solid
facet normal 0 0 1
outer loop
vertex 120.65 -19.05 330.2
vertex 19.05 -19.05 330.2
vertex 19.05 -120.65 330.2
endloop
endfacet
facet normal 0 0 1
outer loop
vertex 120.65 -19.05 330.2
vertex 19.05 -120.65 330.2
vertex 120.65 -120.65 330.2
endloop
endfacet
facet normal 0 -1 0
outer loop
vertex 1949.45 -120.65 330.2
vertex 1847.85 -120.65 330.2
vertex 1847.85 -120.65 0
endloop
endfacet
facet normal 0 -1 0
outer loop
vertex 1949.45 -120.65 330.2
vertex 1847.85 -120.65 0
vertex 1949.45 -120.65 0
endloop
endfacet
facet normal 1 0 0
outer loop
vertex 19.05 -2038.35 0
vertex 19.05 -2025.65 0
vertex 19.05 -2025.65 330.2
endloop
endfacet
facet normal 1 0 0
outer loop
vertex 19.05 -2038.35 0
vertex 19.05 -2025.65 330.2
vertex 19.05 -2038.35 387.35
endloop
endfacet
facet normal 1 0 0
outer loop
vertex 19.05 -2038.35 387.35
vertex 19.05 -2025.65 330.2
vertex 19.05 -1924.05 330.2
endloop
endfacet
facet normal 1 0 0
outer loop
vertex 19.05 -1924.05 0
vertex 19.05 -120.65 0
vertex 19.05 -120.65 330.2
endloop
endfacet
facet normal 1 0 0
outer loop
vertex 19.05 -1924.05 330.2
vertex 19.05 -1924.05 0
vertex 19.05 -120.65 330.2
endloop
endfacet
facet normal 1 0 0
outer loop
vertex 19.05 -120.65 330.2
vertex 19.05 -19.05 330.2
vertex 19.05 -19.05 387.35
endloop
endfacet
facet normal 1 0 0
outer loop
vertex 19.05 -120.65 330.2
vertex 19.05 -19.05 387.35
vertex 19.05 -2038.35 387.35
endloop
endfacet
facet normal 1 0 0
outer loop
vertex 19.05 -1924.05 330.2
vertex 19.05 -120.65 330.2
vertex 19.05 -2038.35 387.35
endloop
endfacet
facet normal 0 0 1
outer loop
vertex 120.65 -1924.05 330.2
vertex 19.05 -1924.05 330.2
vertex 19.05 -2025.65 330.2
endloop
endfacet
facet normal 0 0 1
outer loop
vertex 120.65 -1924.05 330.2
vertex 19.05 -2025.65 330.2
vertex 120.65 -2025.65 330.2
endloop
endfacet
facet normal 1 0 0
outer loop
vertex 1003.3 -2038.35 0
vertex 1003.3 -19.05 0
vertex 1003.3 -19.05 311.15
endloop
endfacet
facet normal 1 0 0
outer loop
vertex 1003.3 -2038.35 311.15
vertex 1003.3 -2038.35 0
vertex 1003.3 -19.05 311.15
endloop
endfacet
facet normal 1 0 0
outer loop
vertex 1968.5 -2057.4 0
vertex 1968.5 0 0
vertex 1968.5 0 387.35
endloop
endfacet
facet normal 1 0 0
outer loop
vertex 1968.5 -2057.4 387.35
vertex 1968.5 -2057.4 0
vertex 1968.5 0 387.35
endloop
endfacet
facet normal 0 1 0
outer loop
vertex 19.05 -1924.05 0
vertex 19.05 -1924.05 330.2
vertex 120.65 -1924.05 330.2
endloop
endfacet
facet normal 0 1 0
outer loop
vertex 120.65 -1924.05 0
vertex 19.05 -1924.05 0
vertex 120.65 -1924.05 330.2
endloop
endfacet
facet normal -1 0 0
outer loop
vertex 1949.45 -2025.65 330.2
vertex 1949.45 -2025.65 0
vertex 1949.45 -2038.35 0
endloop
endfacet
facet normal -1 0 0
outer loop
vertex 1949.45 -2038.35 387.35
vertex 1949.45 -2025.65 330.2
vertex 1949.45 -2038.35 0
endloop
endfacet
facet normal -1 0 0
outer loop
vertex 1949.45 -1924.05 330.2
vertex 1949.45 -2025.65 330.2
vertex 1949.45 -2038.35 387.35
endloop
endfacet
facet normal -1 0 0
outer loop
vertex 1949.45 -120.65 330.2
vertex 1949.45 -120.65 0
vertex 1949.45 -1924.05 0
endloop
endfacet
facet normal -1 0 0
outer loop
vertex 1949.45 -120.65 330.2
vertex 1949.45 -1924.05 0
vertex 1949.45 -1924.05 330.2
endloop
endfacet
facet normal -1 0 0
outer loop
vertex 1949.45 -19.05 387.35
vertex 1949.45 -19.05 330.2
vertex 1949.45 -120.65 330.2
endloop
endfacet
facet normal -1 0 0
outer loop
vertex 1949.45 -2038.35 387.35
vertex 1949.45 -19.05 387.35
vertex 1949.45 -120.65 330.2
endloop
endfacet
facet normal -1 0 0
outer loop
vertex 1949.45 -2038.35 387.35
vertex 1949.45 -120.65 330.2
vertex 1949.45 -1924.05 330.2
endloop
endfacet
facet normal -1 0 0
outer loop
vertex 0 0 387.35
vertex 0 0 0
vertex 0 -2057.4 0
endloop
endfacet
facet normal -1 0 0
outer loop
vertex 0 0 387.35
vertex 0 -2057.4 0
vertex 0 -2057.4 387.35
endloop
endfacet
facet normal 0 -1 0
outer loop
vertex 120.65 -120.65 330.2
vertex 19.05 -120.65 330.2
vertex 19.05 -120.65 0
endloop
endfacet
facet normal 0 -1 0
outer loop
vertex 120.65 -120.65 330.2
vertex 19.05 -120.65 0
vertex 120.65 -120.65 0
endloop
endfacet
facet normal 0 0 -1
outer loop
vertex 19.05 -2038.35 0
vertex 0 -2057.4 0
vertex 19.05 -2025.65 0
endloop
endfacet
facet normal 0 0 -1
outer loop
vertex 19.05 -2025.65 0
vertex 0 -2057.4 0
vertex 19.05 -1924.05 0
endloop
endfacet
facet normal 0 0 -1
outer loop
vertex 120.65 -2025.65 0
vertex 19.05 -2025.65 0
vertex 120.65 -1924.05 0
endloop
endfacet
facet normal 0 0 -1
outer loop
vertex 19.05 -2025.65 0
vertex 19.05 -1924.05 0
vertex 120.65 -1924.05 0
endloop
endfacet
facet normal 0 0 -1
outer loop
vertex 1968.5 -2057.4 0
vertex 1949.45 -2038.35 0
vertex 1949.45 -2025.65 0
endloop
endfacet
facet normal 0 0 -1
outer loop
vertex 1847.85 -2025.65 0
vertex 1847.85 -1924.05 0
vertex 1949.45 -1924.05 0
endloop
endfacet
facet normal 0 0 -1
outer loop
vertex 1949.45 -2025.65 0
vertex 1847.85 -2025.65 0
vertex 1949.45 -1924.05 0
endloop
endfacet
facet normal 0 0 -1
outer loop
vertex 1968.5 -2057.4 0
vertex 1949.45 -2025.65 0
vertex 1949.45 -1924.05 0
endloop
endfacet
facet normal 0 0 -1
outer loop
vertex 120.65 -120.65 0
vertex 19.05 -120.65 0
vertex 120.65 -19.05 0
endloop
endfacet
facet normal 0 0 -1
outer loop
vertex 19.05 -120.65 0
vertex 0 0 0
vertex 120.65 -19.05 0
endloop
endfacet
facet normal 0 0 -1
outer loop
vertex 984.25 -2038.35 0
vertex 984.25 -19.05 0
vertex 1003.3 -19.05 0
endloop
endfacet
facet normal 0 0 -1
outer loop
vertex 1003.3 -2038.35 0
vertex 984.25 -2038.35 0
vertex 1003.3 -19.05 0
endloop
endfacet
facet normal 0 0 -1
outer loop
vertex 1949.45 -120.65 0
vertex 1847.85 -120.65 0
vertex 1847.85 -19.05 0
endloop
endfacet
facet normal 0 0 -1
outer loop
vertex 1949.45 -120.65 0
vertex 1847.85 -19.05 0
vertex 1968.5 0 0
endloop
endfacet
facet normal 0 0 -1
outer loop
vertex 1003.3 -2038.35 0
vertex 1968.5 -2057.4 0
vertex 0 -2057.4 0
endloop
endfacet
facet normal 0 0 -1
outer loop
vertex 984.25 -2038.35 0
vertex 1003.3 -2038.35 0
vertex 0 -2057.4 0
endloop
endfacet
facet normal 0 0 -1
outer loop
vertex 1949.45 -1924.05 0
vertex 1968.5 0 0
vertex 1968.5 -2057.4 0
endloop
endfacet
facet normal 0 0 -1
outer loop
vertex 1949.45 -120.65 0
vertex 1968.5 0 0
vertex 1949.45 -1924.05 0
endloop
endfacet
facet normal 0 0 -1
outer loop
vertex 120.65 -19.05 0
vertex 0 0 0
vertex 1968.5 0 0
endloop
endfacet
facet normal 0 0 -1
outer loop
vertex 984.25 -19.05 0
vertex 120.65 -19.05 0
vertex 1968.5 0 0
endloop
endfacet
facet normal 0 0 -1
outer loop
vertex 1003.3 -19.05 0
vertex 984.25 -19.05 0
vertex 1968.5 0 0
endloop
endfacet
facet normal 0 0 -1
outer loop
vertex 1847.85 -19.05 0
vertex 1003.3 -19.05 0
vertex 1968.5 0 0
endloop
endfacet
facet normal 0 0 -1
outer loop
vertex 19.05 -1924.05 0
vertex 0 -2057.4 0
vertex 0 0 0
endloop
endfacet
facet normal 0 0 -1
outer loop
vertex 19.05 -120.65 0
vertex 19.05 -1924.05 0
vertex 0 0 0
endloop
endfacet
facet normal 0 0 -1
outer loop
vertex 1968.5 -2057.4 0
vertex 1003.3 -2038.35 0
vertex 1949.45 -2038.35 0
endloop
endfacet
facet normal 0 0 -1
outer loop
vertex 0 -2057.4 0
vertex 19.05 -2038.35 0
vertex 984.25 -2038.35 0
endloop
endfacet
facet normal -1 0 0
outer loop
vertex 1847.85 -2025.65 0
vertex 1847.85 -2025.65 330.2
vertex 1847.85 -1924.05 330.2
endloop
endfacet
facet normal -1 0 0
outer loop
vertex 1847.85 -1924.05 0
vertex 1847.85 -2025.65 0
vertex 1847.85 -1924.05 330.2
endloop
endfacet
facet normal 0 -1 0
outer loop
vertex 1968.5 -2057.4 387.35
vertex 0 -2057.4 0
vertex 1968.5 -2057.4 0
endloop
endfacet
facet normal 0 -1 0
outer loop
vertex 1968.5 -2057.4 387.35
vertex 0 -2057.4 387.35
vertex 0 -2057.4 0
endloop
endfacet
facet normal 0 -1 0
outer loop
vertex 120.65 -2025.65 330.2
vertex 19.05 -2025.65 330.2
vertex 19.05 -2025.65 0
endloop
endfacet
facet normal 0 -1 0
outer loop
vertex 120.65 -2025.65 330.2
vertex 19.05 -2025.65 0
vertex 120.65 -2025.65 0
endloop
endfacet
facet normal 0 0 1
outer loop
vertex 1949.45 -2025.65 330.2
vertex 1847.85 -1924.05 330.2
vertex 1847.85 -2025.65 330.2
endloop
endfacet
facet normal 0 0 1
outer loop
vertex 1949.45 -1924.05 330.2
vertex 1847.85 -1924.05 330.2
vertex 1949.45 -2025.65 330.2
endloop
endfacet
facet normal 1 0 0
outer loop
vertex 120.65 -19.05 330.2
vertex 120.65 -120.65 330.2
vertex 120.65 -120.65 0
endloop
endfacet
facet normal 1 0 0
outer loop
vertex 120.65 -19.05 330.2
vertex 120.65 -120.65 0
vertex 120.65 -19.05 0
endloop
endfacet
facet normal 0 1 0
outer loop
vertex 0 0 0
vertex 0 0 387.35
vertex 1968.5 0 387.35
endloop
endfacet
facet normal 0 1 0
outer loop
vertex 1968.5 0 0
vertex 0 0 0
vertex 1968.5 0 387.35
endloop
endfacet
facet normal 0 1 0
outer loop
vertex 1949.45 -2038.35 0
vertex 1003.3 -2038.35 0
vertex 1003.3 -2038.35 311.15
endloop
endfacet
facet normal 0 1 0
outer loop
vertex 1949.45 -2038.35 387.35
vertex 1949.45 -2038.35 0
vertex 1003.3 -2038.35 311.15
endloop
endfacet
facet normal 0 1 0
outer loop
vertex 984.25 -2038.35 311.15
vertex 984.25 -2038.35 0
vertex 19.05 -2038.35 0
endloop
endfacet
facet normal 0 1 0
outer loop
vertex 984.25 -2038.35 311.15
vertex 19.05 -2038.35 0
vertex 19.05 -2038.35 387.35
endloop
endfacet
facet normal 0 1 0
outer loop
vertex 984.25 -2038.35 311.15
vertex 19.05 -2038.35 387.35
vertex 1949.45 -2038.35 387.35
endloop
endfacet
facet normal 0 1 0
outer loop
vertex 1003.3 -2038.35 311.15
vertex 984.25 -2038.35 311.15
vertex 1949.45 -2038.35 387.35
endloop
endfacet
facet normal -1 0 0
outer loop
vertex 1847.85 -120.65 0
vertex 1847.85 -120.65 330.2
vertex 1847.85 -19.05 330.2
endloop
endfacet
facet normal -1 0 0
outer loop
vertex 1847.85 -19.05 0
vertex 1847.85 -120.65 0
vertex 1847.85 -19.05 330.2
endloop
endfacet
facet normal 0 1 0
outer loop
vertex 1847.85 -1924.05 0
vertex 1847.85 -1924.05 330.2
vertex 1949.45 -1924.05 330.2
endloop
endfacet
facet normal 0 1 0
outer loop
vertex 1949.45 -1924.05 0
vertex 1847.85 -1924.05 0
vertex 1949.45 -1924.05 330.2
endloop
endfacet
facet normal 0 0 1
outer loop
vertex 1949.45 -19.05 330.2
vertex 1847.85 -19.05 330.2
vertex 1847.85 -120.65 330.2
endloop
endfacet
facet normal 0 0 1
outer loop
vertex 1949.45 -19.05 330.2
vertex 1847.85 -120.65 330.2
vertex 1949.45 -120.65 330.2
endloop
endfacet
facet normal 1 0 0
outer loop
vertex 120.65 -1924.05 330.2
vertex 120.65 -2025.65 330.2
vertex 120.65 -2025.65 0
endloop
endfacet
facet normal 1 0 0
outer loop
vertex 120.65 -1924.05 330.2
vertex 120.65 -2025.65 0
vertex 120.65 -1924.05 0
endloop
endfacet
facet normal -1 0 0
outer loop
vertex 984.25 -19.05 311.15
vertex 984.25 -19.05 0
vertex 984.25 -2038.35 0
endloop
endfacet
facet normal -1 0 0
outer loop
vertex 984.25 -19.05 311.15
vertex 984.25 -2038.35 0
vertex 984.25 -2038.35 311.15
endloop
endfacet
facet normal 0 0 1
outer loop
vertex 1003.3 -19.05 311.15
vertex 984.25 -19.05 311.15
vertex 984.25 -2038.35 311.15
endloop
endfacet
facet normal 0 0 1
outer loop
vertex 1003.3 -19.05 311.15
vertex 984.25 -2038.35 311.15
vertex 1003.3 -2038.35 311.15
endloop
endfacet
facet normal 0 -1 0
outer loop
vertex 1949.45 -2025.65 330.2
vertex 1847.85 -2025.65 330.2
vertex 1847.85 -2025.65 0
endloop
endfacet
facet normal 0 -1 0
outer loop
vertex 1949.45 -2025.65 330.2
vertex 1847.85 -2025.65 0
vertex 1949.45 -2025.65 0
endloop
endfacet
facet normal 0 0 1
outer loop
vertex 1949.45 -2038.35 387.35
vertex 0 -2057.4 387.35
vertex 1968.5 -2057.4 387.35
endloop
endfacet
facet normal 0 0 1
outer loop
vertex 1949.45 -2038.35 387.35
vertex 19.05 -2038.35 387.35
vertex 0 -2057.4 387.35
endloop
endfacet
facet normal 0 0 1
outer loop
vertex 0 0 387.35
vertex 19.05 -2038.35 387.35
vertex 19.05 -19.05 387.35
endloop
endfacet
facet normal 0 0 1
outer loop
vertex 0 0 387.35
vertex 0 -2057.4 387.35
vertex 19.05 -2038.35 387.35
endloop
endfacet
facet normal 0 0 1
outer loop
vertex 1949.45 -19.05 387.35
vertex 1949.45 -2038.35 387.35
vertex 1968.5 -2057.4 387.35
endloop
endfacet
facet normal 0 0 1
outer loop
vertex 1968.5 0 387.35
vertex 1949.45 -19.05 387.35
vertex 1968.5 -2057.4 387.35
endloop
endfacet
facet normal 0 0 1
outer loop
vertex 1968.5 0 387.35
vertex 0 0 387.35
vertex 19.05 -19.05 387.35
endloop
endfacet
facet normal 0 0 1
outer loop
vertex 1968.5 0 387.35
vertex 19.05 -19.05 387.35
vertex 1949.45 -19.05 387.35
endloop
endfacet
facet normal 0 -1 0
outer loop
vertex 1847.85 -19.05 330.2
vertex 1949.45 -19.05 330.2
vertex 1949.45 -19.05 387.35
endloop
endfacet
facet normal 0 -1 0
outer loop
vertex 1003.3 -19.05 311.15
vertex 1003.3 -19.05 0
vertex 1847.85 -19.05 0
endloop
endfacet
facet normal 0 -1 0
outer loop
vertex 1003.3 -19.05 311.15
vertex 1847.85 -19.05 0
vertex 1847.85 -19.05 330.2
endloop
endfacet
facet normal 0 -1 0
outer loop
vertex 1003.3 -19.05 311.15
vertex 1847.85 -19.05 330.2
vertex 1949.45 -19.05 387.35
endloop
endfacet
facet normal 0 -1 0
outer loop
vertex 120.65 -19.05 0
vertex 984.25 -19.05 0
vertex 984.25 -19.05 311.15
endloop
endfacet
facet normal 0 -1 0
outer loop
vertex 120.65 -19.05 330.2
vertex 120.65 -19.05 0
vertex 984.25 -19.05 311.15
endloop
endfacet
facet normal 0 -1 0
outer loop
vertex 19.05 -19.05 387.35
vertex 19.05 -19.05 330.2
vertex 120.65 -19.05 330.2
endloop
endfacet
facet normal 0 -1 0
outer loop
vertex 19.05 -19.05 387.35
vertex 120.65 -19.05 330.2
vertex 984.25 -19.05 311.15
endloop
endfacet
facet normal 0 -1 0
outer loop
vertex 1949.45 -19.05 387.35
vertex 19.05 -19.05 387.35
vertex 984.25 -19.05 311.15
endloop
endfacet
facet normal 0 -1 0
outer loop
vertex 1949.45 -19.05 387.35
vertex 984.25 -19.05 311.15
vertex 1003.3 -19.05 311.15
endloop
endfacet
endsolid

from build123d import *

# Parameters (mm, degrees)
F0_W      = 19.05
F0_H      = 387.35
F1_DEPTH  = 2057.4
F2_W      = 19.05
F2_H      = 387.35
F3_DEPTH  = 1930.4
F4_W      = 19.05
F4_H      = 387.35
F5_DEPTH  = 1930.4
F6_W      = 19.05
F6_H      = 387.35
F7_DEPTH  = 2057.4
F8_W      = 101.6
F8_H      = 101.6
F9_DEPTH  = 330.2
F10_W     = 19.05
F10_H     = 311.15
F11_DEPTH = 2025.65


with BuildPart() as f1:
    # F0 (on Front) → F1 (new body)
    with BuildSketch(Plane.XZ):
        with Locations((9.525, 193.675)):
            Rectangle(F0_W, F0_H)
    extrude(amount=F1_DEPTH)

    # F2 (on face) → F3 (join)
    with BuildSketch(Plane.YZ.offset(19.05)):
        with Locations((-2047.875, 193.675)):
            Rectangle(F2_W, F2_H)
    extrude(amount=F3_DEPTH)

    # F4 (on face) → F5 (join)
    with BuildSketch(Plane.YZ.offset(19.05)):
        with Locations((-9.525, 193.675)):
            Rectangle(F4_W, F4_H)
    extrude(amount=F5_DEPTH)

    # F6 (on Front) → F7 (join)
    with BuildSketch(Plane.XZ):
        with Locations((1958.975, 193.675)):
            Rectangle(F6_W, F6_H)
    extrude(amount=F7_DEPTH)

    # F8 (on Top) → F9 (join)
    with BuildSketch(Plane.XY):
        with Locations((69.85, -69.85)):
            Rectangle(F8_W, F8_H)
        with Locations((1898.65, -69.85)):
            Rectangle(F8_W, F8_H)
        with Locations((1898.65, -1974.85)):
            Rectangle(F8_W, F8_H)
        with Locations((69.85, -1974.85)):
            Rectangle(F8_W, F8_H)
    extrude(amount=F9_DEPTH)

    # F10 (on face) → F11 (join)
    with BuildSketch(Plane.XZ.offset(19.05)):
        with Locations((993.775, 155.575)):
            Rectangle(F10_W, F10_H)
    extrude(amount=F11_DEPTH)


solid = f1.part
